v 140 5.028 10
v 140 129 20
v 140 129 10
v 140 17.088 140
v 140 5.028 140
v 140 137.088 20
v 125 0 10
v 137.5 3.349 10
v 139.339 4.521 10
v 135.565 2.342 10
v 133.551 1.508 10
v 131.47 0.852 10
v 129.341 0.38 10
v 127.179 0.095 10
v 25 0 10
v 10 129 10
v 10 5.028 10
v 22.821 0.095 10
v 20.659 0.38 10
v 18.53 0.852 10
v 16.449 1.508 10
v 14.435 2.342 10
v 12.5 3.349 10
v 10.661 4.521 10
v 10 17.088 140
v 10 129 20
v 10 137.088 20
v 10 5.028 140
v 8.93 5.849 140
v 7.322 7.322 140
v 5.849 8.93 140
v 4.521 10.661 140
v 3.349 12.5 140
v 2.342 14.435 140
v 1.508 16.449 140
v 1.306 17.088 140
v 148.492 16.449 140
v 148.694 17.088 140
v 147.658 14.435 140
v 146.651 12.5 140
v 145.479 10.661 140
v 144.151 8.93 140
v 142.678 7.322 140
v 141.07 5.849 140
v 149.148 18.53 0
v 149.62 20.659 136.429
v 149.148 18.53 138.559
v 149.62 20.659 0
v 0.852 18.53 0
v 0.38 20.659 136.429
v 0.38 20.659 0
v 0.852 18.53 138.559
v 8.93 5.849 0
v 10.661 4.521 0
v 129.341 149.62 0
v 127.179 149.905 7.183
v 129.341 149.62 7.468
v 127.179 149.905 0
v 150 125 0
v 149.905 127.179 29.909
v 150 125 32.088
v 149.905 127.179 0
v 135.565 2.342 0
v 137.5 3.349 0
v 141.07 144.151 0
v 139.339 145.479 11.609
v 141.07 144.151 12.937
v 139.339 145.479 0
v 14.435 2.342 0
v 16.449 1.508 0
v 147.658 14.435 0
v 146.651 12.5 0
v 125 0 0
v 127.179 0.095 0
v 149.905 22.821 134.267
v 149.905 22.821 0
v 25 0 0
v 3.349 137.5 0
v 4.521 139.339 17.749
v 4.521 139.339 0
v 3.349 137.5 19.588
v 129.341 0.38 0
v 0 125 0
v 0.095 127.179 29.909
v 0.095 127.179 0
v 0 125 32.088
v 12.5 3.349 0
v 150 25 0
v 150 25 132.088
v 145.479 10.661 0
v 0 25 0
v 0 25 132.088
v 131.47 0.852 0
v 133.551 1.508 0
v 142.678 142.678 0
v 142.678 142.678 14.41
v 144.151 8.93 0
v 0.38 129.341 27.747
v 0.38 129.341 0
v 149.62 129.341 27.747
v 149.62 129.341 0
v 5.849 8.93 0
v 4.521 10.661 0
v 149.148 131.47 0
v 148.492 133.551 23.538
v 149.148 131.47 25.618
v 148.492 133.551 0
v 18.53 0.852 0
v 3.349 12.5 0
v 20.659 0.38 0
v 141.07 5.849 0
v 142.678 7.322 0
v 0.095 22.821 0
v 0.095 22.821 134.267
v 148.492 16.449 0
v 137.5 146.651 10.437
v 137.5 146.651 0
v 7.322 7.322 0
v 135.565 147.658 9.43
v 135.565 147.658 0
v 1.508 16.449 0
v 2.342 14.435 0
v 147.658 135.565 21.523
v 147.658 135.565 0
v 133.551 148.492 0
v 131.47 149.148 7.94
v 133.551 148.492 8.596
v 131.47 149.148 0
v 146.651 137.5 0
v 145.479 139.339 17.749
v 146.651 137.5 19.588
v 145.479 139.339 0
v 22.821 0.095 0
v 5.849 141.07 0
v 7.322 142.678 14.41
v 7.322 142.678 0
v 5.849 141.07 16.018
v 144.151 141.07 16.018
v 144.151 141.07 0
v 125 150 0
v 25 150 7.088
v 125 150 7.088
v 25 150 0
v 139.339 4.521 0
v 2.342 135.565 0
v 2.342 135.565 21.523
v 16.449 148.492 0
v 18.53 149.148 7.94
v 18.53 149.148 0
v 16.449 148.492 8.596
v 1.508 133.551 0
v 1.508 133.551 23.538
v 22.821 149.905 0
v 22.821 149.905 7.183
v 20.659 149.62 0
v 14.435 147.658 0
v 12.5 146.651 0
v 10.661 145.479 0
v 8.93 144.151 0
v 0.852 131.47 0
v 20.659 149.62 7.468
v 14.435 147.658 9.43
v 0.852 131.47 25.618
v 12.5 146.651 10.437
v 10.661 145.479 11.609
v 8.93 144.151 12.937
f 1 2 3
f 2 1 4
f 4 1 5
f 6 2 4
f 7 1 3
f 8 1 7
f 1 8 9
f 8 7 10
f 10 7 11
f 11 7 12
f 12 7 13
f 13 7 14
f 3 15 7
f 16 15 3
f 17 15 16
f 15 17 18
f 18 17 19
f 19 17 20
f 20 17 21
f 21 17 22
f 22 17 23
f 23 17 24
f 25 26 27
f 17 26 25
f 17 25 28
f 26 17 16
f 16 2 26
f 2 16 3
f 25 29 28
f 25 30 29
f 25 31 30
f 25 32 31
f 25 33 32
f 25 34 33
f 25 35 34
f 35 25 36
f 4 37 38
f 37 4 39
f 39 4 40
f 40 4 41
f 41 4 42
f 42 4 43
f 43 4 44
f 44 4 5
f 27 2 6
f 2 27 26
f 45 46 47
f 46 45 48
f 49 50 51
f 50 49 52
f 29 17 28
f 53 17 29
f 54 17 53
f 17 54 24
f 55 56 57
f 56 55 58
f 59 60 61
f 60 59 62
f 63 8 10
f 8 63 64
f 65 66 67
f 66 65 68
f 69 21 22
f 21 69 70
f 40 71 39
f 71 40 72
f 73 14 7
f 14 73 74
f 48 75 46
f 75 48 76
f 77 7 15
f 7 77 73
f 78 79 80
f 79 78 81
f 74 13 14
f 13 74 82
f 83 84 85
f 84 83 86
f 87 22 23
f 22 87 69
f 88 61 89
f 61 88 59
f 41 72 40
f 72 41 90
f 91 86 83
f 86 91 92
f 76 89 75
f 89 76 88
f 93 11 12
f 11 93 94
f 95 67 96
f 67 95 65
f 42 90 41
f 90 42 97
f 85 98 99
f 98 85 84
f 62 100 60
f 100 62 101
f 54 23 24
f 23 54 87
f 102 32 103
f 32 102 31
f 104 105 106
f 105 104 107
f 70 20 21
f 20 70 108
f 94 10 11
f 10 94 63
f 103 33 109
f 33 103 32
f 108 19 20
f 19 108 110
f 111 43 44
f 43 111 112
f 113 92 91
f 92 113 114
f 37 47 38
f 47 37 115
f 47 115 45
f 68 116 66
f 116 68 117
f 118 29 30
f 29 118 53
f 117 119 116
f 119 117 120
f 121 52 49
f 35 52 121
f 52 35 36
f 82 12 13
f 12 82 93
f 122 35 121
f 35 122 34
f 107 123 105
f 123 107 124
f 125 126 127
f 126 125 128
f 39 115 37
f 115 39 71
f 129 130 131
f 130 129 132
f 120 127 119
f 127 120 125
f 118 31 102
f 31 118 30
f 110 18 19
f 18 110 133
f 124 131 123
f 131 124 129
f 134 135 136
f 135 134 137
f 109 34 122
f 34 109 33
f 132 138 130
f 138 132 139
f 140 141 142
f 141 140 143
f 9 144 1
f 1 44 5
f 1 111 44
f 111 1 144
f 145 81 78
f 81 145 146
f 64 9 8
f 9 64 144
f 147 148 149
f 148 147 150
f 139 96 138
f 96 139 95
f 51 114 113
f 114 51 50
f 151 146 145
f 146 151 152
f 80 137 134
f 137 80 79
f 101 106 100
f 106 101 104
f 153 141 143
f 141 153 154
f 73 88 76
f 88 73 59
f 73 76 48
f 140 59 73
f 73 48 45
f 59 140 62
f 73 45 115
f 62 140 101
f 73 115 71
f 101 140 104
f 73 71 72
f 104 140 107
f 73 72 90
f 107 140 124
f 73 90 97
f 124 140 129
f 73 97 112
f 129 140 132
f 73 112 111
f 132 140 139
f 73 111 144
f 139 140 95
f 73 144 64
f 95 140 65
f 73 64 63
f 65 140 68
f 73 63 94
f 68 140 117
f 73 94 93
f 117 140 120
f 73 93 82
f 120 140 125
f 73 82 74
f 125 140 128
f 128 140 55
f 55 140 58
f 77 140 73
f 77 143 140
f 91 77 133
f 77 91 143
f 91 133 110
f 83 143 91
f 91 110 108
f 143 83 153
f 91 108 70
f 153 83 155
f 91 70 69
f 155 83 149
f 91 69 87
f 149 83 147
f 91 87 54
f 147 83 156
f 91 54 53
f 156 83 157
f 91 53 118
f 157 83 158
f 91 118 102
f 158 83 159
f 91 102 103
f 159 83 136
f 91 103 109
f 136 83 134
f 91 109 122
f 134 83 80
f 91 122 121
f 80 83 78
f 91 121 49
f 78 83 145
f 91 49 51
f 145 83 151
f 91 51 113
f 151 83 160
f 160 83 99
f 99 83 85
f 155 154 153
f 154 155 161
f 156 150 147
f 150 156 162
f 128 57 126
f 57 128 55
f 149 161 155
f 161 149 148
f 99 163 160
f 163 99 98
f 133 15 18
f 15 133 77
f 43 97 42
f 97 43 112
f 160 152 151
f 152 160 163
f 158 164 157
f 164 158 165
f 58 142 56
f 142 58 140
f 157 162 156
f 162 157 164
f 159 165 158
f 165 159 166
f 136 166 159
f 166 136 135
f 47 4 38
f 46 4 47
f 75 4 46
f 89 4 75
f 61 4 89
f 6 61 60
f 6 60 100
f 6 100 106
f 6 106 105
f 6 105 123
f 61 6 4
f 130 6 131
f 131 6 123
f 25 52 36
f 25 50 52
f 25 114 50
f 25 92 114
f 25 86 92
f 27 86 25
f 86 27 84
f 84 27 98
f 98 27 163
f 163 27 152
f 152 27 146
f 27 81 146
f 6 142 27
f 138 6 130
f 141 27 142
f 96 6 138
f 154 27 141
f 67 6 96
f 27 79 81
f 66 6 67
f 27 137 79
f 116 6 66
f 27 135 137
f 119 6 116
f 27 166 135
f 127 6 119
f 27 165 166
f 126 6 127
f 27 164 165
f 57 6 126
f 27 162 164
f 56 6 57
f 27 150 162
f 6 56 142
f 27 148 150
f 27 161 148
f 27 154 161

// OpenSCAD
$fn = 72;

size = 100;
bottom_offset = 10;
thickness_wall = 10;

module stand() {
    minkowski() {
        cube(size);
        cylinder(r = size/4, h = size/2);
    }
}

module slope() {
    translate([-size/2, sqrt(size*size*2)+(size-2)/2, -size/3]) rotate([45, 0, 0]) scale([3, 3, 4]) cube(size);
}

module hole() {
    union() {
        translate([thickness_wall, -1, thickness_wall]) scale([1, 1, 1.5]) cube((size*1.5)-thickness_wall*2);
        translate([0, 0, (size*1.5)-thickness_wall]) cube(size*1.5);
    }
    translate([thickness_wall, thickness_wall, thickness_wall*2]) scale([1, 1, 1.5]) cube((size*1.5)-thickness_wall*2);
}

module photo() {
    rotate([90, 0, 0])
        translate([size*0.75, size*0.75, -thickness_wall])
            scale([size*0.00525, size*0.00525, thickness_wall/(size*2)])
                surface("image.png", true, false, 0);
}



union() {
    difference() {
        translate([size/4, size/4, 0]) stand();
        slope();
        hole();
    }
    photo();
}
